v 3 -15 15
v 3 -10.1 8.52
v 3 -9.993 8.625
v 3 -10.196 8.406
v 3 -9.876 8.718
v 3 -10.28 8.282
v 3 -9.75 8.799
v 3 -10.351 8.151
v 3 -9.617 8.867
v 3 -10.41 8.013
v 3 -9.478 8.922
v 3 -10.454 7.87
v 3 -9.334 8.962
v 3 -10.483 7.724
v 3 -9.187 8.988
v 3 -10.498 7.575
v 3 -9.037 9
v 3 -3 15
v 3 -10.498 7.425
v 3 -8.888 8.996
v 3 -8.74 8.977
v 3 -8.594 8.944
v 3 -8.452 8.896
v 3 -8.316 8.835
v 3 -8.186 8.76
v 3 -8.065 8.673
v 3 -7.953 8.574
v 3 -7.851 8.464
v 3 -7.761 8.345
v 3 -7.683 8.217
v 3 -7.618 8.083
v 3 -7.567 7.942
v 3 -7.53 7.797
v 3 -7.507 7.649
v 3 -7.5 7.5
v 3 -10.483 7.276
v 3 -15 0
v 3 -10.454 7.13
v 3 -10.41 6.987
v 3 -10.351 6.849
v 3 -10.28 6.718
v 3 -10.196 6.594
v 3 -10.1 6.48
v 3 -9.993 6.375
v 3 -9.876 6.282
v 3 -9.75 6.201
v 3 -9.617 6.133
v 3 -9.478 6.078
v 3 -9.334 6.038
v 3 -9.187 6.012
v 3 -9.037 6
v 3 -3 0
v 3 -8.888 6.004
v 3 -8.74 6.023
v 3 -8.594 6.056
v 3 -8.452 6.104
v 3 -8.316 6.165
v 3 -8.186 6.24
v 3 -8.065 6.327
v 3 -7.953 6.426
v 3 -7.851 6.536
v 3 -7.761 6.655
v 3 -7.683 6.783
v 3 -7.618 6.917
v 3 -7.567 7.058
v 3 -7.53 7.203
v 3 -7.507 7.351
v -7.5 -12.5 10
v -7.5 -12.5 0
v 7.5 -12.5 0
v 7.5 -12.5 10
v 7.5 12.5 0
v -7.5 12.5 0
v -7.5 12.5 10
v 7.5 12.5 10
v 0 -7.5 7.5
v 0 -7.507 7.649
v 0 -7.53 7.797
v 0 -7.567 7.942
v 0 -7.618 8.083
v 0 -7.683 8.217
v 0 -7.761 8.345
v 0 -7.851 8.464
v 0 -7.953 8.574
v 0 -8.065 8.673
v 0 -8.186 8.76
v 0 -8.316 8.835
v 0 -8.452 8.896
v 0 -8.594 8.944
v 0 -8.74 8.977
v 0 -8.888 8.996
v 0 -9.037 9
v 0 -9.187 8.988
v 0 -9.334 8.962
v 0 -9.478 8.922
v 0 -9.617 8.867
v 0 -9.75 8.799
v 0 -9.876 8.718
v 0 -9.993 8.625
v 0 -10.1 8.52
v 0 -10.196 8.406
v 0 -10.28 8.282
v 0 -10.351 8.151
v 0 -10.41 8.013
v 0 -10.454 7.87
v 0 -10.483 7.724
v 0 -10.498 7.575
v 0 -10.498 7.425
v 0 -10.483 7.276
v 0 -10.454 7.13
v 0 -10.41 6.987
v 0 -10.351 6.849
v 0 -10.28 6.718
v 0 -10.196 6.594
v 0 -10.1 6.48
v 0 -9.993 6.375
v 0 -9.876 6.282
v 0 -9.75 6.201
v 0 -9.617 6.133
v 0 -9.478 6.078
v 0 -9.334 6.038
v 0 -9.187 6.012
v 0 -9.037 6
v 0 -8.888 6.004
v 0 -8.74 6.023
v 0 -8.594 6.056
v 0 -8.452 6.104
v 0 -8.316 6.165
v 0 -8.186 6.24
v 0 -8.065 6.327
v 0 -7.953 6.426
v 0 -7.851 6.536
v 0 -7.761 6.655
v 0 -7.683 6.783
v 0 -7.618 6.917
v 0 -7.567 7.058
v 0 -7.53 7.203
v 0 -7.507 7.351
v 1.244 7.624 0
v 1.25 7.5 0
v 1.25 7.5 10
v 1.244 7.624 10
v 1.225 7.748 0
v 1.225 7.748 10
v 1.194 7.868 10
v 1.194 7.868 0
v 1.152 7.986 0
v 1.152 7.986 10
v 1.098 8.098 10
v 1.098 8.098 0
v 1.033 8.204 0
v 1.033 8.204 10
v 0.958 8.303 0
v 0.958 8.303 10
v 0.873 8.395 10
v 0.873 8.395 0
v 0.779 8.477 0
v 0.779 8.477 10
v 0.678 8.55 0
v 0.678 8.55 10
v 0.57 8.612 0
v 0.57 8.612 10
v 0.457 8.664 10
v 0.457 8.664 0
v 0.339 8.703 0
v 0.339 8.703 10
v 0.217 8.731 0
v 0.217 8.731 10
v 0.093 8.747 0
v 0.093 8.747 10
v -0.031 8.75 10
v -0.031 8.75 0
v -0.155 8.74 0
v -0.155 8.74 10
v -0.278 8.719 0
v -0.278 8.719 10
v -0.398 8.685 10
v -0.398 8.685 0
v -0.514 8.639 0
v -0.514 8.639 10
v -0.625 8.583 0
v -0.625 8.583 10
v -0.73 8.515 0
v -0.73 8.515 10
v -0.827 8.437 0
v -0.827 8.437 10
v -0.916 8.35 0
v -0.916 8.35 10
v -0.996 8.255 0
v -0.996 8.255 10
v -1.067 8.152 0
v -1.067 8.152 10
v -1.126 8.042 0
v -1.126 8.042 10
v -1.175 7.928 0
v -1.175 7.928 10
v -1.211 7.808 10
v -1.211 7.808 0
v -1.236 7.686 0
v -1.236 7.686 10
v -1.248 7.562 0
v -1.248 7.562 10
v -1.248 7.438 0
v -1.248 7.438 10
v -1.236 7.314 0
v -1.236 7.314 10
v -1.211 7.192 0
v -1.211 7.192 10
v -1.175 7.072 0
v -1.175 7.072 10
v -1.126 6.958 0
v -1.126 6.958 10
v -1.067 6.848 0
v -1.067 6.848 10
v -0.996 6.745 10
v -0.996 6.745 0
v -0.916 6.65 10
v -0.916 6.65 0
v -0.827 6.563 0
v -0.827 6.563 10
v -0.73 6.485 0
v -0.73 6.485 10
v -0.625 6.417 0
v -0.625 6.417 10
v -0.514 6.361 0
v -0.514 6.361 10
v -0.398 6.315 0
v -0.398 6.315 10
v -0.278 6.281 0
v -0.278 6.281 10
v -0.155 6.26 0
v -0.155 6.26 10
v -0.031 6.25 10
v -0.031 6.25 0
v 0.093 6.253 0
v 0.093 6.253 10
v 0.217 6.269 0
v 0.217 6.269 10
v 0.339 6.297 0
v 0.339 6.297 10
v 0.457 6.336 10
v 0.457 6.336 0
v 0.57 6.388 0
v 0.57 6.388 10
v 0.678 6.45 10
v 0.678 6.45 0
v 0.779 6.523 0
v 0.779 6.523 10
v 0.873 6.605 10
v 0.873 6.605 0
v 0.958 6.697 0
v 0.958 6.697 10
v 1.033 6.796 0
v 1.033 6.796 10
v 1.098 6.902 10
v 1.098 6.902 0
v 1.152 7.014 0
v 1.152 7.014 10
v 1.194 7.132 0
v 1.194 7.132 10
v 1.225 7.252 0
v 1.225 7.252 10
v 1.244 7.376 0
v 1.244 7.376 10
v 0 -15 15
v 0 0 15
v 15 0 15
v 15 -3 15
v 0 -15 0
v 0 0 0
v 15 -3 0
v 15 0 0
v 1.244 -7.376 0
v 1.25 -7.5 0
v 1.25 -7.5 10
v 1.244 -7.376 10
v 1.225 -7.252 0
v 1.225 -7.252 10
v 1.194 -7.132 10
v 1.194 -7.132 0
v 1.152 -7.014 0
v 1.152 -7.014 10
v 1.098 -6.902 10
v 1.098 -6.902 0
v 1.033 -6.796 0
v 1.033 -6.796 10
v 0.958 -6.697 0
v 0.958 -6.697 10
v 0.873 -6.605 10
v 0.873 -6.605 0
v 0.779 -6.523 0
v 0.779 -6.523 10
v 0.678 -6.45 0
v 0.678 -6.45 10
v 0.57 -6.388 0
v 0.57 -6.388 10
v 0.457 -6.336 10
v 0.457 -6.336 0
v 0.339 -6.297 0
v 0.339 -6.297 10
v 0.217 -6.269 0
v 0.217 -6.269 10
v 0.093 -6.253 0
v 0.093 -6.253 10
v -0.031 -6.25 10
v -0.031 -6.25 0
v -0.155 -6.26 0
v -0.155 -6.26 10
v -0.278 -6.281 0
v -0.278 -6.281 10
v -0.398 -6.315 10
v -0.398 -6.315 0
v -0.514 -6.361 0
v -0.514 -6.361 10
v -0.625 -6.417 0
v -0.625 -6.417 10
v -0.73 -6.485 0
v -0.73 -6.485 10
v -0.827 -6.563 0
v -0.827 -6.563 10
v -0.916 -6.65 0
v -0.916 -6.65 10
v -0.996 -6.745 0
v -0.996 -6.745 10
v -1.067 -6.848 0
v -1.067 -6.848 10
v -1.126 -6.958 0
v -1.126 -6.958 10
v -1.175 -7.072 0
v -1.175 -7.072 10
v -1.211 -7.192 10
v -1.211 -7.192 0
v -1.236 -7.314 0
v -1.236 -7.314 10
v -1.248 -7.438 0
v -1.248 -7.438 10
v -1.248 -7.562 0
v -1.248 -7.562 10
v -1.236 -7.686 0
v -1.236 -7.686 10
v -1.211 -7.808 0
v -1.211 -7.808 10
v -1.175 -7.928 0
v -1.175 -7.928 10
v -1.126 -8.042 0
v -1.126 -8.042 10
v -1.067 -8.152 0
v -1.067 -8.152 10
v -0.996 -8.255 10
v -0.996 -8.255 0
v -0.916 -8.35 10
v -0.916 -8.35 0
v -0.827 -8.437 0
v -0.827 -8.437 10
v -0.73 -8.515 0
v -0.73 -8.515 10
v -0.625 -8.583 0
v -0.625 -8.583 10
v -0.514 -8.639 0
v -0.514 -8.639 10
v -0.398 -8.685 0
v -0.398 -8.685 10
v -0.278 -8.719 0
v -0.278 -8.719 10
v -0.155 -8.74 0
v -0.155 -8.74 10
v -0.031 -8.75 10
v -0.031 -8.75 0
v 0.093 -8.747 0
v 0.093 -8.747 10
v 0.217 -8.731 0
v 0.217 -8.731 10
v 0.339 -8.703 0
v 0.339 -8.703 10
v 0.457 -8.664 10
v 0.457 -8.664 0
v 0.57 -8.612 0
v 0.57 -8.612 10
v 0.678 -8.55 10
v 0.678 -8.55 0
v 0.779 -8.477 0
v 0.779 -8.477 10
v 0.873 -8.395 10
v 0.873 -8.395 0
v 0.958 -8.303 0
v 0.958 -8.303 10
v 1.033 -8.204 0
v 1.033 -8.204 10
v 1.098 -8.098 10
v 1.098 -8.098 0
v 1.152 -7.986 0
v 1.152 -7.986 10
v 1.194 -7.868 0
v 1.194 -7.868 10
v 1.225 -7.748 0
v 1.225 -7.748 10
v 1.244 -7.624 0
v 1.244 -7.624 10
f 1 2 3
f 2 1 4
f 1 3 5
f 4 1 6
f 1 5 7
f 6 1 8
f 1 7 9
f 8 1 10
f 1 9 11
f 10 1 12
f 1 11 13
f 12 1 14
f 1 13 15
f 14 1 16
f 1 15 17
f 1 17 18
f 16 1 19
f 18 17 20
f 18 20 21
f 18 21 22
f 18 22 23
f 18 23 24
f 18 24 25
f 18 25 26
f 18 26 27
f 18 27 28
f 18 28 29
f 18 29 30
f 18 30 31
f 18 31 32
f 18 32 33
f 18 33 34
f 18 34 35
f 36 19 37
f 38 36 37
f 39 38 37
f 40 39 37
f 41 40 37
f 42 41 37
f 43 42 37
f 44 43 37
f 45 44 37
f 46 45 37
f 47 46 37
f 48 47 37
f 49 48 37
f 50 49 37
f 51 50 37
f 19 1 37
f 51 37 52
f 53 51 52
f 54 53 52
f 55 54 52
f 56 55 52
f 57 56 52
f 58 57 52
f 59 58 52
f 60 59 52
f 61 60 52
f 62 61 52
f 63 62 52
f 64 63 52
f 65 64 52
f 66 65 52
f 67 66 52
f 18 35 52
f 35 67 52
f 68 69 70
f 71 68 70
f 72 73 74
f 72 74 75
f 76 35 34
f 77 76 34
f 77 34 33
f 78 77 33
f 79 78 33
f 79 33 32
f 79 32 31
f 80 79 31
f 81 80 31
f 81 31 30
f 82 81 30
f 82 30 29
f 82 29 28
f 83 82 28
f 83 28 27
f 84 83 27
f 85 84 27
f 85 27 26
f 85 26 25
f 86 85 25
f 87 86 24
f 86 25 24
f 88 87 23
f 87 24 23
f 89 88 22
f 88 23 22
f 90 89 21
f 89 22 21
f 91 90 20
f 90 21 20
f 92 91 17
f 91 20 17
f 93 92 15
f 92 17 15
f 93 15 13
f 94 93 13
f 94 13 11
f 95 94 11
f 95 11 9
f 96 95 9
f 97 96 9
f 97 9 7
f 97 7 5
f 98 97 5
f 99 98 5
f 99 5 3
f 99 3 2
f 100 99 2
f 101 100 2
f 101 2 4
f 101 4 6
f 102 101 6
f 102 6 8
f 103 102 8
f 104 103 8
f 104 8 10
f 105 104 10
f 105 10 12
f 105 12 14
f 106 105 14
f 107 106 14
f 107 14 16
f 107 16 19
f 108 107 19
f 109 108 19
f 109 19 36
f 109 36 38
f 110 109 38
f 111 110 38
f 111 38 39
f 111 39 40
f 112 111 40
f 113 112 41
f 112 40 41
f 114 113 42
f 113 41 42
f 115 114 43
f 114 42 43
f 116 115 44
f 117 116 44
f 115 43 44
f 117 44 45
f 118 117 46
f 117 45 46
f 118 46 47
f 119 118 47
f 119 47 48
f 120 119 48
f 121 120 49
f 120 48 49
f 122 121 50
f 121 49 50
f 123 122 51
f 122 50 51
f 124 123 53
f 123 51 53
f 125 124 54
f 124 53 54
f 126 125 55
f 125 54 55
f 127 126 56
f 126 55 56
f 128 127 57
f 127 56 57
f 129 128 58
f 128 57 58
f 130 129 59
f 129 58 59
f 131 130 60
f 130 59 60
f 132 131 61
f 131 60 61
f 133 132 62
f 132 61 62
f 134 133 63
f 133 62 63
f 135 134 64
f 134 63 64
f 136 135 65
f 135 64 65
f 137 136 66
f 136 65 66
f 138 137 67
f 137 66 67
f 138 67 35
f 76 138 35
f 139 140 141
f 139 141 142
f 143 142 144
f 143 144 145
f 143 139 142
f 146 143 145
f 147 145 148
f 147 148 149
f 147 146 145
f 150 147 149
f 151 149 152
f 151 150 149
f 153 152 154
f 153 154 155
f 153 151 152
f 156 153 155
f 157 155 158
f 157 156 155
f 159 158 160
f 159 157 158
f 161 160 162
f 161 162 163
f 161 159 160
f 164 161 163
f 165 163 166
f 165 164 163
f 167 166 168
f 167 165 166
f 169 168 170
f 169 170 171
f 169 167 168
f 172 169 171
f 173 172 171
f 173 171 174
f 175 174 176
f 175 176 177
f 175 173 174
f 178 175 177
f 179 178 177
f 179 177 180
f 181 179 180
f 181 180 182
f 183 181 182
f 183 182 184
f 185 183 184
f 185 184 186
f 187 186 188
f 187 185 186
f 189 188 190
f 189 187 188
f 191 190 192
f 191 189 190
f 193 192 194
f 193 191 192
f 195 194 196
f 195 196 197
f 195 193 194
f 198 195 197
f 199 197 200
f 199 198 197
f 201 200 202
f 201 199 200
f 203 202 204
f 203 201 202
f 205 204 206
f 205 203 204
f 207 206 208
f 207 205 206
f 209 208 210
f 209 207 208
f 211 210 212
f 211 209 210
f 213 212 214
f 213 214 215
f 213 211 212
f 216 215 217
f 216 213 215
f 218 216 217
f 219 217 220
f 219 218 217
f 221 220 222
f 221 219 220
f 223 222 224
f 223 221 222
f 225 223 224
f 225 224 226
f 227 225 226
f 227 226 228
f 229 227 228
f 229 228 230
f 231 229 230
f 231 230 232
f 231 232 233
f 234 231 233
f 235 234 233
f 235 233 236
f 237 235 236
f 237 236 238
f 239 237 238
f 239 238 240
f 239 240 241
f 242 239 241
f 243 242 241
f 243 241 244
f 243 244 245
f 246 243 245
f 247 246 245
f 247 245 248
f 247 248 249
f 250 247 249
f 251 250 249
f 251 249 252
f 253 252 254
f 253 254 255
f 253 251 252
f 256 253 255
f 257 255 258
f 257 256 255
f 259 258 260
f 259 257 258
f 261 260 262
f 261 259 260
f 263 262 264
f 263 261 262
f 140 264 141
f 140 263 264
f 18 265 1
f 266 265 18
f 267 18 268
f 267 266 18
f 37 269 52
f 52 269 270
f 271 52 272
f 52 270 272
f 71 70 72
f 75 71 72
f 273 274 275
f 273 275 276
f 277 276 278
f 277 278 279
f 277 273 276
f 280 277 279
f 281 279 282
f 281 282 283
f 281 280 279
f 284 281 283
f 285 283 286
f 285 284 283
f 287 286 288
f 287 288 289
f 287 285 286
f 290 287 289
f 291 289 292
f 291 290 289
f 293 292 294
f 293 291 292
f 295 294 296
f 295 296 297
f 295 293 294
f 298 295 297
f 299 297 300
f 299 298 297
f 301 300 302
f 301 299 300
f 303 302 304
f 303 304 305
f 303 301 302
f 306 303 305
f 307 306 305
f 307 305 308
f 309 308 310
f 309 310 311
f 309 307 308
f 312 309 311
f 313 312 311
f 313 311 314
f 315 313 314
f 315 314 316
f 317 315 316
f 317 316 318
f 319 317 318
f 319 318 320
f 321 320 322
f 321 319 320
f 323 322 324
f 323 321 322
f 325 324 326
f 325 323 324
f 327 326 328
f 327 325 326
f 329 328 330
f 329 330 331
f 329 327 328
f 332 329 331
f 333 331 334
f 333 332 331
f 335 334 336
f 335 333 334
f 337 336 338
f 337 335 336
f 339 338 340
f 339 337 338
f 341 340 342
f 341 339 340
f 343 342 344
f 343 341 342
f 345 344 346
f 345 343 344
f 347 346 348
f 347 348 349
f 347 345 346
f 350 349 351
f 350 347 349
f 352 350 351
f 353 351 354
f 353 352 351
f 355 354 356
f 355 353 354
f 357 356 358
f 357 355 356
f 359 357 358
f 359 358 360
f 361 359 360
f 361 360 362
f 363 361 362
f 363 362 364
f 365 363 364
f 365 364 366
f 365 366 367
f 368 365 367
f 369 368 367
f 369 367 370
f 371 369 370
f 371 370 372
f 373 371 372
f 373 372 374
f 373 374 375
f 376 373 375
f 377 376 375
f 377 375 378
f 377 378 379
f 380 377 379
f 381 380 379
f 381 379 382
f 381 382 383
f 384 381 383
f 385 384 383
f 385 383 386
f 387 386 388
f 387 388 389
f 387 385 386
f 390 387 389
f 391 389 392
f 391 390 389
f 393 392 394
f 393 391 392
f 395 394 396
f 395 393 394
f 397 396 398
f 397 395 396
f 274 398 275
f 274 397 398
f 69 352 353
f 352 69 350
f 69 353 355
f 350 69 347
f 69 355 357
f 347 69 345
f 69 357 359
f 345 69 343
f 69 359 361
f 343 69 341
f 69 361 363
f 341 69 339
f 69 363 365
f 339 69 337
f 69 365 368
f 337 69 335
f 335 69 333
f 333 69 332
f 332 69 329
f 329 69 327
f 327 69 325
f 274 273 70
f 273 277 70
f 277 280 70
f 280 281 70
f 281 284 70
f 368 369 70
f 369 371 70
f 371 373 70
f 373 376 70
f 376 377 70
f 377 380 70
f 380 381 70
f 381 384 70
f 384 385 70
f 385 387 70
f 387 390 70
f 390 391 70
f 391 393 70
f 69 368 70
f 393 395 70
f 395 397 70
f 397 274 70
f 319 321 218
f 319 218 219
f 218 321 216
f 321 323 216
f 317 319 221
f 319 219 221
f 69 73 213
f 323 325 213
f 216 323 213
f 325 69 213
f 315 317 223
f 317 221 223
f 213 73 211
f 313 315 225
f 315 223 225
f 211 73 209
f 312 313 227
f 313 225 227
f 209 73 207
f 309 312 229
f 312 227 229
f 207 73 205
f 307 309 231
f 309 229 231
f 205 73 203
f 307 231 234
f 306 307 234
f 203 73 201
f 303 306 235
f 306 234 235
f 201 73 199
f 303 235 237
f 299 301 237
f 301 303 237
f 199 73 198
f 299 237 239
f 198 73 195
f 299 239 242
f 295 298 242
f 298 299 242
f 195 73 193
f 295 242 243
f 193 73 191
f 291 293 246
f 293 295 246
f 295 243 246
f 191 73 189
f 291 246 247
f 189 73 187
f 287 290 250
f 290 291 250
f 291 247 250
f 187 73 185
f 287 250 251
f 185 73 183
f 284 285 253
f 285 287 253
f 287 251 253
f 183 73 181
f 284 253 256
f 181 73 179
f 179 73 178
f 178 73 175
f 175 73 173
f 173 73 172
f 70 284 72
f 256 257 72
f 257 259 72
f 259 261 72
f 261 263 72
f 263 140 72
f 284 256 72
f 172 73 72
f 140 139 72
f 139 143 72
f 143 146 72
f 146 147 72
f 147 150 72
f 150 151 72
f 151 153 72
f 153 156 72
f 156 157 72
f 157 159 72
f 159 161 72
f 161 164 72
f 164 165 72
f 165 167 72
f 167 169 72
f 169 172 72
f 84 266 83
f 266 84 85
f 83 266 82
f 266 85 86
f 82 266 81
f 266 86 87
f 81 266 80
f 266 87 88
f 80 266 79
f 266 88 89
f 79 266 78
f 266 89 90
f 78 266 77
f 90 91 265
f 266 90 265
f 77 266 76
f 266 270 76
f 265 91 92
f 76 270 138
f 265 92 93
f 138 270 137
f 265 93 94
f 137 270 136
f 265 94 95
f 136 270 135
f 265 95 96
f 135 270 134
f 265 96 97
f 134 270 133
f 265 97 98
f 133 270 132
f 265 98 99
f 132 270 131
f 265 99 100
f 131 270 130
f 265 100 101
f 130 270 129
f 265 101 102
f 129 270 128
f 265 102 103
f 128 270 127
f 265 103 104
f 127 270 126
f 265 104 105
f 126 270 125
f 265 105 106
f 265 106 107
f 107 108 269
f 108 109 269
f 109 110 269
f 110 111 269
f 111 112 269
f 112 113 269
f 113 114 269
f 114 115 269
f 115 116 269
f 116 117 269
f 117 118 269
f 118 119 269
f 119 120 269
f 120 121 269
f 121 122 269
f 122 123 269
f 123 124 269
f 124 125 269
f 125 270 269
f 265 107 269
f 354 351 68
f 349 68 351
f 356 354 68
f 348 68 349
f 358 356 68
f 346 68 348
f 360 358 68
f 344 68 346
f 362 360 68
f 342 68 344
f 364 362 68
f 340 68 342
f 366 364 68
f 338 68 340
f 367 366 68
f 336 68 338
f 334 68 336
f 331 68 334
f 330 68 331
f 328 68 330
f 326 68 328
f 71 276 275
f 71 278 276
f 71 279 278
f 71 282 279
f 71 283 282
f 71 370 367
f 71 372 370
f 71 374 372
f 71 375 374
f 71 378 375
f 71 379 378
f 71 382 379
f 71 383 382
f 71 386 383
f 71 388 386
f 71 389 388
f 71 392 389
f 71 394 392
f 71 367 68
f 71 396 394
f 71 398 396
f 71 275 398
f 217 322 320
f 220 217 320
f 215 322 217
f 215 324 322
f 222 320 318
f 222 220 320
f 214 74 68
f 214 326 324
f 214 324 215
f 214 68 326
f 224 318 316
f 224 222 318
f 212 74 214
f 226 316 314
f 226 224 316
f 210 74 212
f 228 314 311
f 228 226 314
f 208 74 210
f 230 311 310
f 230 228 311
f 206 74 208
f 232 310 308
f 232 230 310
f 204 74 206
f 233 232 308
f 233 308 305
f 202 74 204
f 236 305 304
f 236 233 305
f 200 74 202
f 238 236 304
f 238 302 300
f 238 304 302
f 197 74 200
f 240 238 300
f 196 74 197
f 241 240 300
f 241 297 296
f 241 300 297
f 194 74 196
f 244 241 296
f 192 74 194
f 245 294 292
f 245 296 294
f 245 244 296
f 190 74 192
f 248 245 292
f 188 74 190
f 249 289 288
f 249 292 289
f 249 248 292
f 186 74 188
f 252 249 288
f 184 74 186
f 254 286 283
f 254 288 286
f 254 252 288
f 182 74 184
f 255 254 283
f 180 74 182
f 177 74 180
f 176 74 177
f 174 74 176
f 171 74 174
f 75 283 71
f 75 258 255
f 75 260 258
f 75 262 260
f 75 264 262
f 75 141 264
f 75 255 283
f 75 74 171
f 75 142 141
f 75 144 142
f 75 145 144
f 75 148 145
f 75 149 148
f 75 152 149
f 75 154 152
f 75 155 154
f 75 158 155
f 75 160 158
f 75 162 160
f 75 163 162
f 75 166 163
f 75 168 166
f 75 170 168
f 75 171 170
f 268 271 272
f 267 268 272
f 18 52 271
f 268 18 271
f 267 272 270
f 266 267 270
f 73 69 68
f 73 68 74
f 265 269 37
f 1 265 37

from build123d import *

# Parameters (mm, degrees)
SKETCH_W     = 15
SKETCH_H     = 25
SKETCH_R     = 1.25
PAD_DEPTH    = 10
PAD001_DEPTH = 15
SKETCH003_R  = 1.5
POCKET_DEPTH = 3.001


with BuildPart() as body:
    # Sketch → Pad (new body)
    with BuildSketch(Plane.XY):
        Rectangle(SKETCH_W, SKETCH_H)
        with Locations((0, 7.5)):
            Circle(SKETCH_R, mode=Mode.SUBTRACT)
        with Locations((0, -7.5)):
            Circle(SKETCH_R, mode=Mode.SUBTRACT)
    extrude(amount=PAD_DEPTH)


with BuildPart() as body001:
    # Sketch001 → Pad001 (new body)
    with BuildSketch(Plane.XY):
        Polygon((0, 0), (0, -15), (3, -15), (3, -3), (15, -3), (15, 0), align=None)
    extrude(amount=PAD001_DEPTH)

    # Sketch003 (on Face3 of Pad001) → Pocket (cut, through all)
    with BuildSketch(Plane.YZ.offset(3)):
        with Locations((-9, 7.5)):
            Circle(SKETCH003_R)
    extrude(amount=-POCKET_DEPTH, mode=Mode.SUBTRACT)


solid = Compound([body.part, body001.part])
